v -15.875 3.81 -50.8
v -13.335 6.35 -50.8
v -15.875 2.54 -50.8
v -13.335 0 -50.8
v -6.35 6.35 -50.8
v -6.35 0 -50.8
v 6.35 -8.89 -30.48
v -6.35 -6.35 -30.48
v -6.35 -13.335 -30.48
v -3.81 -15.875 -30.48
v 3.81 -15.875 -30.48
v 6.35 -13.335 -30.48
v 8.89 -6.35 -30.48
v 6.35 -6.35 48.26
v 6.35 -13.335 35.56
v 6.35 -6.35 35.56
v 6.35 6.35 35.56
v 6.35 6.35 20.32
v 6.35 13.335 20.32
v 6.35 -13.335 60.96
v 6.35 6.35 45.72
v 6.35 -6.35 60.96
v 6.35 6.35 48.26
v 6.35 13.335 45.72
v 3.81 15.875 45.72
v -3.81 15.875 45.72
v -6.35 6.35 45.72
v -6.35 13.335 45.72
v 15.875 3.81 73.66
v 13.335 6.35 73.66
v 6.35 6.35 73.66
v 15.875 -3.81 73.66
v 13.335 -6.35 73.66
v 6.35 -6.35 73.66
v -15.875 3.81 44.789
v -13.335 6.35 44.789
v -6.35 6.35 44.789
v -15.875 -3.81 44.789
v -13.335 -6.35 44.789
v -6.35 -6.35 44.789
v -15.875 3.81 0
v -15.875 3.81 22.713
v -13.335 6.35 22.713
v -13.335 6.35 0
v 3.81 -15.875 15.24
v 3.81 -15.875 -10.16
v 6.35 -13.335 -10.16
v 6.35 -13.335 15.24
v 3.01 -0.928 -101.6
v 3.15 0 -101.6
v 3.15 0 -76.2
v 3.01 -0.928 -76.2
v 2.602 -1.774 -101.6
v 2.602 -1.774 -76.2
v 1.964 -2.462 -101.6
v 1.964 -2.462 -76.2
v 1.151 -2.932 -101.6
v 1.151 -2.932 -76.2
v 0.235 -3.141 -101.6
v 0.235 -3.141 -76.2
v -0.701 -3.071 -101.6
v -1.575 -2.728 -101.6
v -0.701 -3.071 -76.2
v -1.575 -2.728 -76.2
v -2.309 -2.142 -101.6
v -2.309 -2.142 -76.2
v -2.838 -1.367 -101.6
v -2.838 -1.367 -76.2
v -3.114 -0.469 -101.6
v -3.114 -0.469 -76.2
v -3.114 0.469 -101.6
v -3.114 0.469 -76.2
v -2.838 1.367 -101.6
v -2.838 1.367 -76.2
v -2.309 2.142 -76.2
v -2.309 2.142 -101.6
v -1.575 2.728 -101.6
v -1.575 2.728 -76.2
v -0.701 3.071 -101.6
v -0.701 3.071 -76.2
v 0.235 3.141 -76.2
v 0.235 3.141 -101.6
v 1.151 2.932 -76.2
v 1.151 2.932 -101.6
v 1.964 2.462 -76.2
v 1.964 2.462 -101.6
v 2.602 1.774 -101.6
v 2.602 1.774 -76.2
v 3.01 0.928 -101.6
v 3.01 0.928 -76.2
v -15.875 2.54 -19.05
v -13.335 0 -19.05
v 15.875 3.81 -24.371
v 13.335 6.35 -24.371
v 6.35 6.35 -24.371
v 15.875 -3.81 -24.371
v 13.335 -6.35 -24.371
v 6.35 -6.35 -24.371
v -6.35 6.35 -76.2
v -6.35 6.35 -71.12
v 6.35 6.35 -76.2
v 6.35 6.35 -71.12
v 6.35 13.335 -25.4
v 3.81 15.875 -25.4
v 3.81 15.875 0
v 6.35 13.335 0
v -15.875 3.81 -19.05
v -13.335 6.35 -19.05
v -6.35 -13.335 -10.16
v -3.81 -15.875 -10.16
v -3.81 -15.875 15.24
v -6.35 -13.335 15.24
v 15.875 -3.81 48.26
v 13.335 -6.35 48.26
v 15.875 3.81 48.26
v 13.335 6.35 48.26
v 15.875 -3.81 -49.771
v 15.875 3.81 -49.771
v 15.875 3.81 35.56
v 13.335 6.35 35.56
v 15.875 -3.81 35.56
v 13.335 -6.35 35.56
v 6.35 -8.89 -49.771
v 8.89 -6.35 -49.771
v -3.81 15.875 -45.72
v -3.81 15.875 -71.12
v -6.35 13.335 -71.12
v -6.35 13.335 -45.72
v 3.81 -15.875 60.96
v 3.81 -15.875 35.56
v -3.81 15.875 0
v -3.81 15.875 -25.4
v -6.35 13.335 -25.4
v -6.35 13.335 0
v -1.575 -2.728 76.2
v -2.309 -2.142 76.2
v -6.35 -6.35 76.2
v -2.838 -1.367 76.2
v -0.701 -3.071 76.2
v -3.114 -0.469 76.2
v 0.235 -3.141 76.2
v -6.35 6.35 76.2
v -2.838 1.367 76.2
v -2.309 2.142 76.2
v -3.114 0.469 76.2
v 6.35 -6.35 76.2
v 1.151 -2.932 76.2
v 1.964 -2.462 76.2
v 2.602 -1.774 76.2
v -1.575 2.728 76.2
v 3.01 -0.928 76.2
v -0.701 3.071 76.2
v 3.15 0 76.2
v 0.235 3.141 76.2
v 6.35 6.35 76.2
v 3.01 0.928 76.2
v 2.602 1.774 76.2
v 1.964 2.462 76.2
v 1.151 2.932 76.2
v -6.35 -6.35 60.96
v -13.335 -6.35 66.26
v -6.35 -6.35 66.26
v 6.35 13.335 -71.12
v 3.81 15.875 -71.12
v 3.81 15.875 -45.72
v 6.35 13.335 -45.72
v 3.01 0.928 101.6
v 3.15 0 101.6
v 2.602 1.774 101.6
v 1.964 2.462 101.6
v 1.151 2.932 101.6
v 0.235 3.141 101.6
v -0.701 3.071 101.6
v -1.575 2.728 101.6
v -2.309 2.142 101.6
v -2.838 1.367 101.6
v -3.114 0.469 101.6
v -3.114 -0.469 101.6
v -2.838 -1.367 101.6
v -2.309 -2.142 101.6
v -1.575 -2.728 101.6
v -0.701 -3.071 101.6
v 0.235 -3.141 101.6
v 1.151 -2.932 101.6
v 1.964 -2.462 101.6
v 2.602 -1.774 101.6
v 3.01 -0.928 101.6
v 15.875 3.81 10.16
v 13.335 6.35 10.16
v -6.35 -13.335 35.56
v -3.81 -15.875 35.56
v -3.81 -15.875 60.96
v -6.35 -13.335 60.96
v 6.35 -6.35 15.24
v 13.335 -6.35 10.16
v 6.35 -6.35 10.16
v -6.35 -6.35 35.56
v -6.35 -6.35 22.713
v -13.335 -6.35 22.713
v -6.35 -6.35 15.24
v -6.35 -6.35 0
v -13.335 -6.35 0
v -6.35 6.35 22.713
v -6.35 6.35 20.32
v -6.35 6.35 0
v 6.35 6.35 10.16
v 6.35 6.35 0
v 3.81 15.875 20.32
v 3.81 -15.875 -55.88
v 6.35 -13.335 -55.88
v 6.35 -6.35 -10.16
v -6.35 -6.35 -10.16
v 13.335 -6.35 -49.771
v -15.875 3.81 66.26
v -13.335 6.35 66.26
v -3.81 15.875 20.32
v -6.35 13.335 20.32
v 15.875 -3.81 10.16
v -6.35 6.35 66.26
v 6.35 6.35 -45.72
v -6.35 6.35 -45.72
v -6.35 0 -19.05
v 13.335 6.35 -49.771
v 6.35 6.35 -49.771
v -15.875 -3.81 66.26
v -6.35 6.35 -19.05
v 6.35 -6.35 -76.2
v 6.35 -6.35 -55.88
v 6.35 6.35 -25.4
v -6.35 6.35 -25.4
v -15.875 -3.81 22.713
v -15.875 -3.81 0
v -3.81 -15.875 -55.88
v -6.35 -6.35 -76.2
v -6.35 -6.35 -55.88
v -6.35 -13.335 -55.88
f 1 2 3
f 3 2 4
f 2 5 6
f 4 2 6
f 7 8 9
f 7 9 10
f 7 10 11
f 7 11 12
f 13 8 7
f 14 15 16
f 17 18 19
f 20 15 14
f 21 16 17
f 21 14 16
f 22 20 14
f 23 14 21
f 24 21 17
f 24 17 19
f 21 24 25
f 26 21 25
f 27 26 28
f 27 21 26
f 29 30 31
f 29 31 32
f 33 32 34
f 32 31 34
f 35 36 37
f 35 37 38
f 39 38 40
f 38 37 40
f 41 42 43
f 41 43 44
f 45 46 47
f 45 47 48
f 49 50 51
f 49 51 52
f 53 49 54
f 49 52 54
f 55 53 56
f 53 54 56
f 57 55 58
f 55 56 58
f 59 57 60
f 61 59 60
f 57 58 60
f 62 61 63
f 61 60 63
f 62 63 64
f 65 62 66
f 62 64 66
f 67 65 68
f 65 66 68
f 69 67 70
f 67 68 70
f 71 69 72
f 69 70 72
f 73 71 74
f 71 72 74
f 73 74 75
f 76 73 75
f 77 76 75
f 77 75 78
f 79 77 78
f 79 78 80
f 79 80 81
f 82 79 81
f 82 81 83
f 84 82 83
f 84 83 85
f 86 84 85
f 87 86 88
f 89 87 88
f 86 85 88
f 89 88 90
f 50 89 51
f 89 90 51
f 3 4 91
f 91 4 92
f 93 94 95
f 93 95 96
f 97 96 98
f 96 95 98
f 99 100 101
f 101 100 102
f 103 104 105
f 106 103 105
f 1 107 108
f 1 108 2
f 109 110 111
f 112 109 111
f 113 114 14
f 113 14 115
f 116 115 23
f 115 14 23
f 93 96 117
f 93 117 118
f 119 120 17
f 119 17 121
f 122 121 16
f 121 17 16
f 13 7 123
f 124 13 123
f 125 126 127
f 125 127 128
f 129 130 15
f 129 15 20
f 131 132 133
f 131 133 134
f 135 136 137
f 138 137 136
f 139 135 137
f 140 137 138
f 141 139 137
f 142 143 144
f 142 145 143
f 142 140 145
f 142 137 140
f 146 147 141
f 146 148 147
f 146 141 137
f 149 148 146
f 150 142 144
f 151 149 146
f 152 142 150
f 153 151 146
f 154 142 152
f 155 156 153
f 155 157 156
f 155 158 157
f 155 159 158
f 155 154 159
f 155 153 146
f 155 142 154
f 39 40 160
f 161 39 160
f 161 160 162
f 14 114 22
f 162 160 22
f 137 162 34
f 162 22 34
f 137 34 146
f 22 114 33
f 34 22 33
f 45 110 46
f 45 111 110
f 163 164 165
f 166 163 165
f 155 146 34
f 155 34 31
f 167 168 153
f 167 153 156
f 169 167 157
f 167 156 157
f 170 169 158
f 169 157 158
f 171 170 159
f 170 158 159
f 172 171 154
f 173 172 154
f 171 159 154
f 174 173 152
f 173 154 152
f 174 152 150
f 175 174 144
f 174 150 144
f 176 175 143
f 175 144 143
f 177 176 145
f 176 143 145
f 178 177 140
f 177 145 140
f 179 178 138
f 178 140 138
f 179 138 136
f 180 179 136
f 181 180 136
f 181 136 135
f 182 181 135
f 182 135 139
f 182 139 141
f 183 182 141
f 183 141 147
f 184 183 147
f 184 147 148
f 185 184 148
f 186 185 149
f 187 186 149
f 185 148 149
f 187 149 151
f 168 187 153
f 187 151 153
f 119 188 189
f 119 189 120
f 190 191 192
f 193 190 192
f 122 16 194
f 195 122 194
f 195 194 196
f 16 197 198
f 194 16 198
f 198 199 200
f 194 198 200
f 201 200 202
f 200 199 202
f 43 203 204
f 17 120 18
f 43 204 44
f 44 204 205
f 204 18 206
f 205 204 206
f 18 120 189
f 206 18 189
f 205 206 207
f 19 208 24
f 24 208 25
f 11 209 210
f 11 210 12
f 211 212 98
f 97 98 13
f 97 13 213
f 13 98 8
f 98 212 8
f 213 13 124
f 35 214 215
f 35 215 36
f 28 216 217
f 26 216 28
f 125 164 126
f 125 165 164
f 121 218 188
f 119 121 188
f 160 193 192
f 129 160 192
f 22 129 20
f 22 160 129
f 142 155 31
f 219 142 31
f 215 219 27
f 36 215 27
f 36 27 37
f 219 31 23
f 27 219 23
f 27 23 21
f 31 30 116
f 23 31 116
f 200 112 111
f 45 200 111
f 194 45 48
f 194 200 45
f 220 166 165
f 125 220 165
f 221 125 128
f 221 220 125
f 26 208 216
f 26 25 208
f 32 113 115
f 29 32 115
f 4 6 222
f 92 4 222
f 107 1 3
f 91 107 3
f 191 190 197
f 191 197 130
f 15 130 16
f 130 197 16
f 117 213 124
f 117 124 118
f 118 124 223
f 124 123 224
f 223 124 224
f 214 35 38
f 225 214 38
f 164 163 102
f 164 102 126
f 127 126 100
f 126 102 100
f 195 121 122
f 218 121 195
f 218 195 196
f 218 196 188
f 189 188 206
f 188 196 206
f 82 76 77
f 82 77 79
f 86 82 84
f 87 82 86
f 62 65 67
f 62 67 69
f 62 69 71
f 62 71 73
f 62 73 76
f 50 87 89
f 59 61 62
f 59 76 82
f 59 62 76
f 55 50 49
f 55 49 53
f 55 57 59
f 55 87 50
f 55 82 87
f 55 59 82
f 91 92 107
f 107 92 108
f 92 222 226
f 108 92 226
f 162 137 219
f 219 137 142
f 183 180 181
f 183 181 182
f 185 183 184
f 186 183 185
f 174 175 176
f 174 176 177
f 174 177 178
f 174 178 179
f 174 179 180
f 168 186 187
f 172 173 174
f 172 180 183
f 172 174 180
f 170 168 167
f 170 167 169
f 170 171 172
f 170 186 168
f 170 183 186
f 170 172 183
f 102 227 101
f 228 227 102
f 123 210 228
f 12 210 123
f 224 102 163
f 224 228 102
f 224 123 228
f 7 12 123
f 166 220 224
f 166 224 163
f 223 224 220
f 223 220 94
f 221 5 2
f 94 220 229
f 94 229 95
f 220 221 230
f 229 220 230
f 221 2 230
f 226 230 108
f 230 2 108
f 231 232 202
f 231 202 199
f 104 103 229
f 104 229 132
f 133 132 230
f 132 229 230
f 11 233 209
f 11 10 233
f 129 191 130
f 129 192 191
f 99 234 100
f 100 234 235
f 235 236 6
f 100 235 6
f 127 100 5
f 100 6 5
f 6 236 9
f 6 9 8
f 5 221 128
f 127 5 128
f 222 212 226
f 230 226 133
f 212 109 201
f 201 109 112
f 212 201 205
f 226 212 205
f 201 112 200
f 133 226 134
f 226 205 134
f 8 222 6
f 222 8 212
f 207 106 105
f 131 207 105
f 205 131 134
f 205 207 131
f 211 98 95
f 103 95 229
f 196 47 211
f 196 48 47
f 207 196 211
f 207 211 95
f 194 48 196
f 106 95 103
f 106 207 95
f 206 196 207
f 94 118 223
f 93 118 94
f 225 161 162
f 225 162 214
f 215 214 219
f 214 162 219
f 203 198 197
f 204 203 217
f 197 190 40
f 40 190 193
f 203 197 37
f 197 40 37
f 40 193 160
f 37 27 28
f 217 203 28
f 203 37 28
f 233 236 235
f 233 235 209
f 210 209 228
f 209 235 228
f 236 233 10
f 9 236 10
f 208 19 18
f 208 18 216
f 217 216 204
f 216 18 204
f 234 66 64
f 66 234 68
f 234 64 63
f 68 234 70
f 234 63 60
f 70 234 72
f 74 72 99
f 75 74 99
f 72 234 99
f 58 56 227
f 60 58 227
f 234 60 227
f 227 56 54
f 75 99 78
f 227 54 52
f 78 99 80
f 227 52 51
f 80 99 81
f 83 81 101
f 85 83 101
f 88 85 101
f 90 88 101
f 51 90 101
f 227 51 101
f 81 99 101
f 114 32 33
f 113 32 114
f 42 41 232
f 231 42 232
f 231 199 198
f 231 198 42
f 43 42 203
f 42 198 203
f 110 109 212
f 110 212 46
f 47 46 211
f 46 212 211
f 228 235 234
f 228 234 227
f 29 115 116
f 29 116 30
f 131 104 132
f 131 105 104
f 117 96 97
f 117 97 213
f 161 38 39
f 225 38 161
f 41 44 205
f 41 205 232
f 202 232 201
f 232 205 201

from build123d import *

# Parameters (mm, degrees)
F0_W      = 12.7
F0_H      = 12.7
F1_DEPTH  = 76.2
F2_W      = 12.7
F2_H      = 25.4
F3_DEPTH  = 9.525
F4_W      = 12.7
F4_H      = 25.4
F5_DEPTH  = 9.525
F7_DEPTH  = 9.525
F9_DEPTH  = 9.525
F10_R     = 3.1496
F11_DEPTH = 25.4
F12_R     = 3.1496
F13_DEPTH = 25.4
F14_SIZE  = 2.54


with BuildPart() as f1:
    # F0 (on Top) → F1 (new body, symmetric)
    with BuildSketch(Plane.XY):
        Rectangle(F0_W, F0_H)
    extrude(amount=F1_DEPTH, both=True)

    # F2 (on face) → F3 (join)
    with BuildSketch(Plane(origin=(0, 6.35, 0), x_dir=(-1, 0, 0), z_dir=(0, 1, 0))):
        with Locations((0, -58.42)):
            Rectangle(F2_W, F2_H)
        with Locations((0, -12.7)):
            Rectangle(F2_W, F2_H)
        with Locations((0, 33.02)):
            Rectangle(F2_W, F2_H)
    extrude(amount=F3_DEPTH)

    # F4 (on face) → F5 (join)
    with BuildSketch(Plane.XZ.offset(6.35)):
        with Locations((0, 48.26)):
            Rectangle(F4_W, F4_H)
        with Locations((0, 2.54)):
            Rectangle(F4_W, F4_H)
        with Locations((0, -43.18)):
            Rectangle(F4_W, F4_H)
    extrude(amount=F5_DEPTH)

    # F6 (on face) → F7 (join)
    with BuildSketch(Plane(origin=(-6.35, 0, 0), x_dir=(0, -1, 0), z_dir=(-1, 0, 0))):
        Polygon((-6.35, 66.260369), (-6.35, 45.72), (-6.35, 44.788861), (6.35, 44.788861), (6.35, 60.96), (6.35, 66.260369), align=None)
        Polygon((-6.35, 20.32), (-6.35, 0), (6.35, 0), (6.35, 15.24), (6.35, 22.712743), (-6.35, 22.712743), align=None)
        Polygon((-6.35, -45.72), (-6.35, -50.8), (0, -50.8), (0, -19.05), (-6.35, -19.05), (-6.35, -25.4), align=None)
    extrude(amount=F7_DEPTH)

    # F8 (on face) → F9 (join)
    with BuildSketch(Plane.YZ.offset(6.35)):
        Polygon((6.35, -24.37056), (-6.35, -24.37056), (-6.35, -30.48), (-6.35, -49.77056), (6.35, -49.77056), (6.35, -45.72), (6.35, -25.4), align=None)
        Polygon((6.35, 35.56), (-6.35, 35.56), (-6.35, 15.24), (-6.35, 10.16), (6.35, 10.16), (6.35, 20.32), align=None)
        Polygon((6.35, 73.66), (-6.35, 73.66), (-6.35, 60.96), (-6.35, 48.26), (6.35, 48.26), align=None)
    extrude(amount=F9_DEPTH)

    # F10 (on face) → F11 (join)
    with BuildSketch(Plane.XY.offset(76.2)):
        Circle(F10_R)
    extrude(amount=F11_DEPTH)

    # F12 (on face) → F13 (join)
    with BuildSketch(Plane(origin=(0, 0, -76.2), x_dir=(1, 0, 0), z_dir=(0, 0, -1))):
        Circle(F12_R)
    extrude(amount=F13_DEPTH)

    # F14
    f14_edges = [f1.edges().sort_by_distance(p)[0] for p in [
        (15.875, -6.35, 60.96),
        (15.875, 6.35, 60.96),
        (6.35, -15.875, 48.26),
        (-6.35, -15.875, 48.26),
        (-15.875, -6.35, 55.524615),
        (-15.875, 6.35, 55.524615),
        (-6.35, 15.875, 33.02),
        (6.35, 15.875, 33.02),
        (15.875, 6.35, 22.86),
        (15.875, -6.35, 22.86),
        (6.35, -15.875, 2.54),
        (-6.35, -15.875, 2.54),
        (-15.875, -6.35, 11.356371),
        (-15.875, 6.35, 11.356371),
        (-6.35, 15.875, -12.7),
        (6.35, 15.875, -12.7),
        (-15.875, 6.35, -34.925),
        (-15.875, 0, -34.925),
        (-6.35, -15.875, -43.18),
        (6.35, -15.875, -43.18),
        (6.35, -6.35, -40.12528),
        (15.875, 6.35, -37.07056),
        (15.875, -6.35, -37.07056),
        (6.35, 15.875, -58.42),
        (-6.35, 15.875, -58.42),
    ]]
    chamfer(f14_edges, length=F14_SIZE)


solid = f1.part
